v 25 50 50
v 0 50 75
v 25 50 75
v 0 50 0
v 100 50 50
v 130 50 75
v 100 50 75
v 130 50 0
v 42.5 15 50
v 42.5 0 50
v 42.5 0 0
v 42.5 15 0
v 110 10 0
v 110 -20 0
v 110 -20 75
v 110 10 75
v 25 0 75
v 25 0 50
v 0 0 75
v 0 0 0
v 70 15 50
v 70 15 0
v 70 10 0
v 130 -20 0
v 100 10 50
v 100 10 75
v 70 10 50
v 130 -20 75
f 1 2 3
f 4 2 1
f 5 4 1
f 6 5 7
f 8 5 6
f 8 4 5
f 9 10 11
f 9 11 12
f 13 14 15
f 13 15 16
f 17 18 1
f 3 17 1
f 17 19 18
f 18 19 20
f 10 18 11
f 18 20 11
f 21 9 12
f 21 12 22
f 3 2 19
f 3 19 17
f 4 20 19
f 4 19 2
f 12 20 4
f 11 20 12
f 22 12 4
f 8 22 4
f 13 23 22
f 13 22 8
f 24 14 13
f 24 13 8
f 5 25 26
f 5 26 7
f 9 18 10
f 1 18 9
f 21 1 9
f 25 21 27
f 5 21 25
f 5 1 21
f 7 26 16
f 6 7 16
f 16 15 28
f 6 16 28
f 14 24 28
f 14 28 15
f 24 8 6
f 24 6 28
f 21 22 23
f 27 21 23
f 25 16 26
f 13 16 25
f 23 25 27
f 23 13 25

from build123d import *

# Parameters (mm, degrees)
F0_W     = 25
F0_H     = 50
F1_DEPTH = 75
F3_DEPTH = 50
F5_DEPTH = 75


with BuildPart() as f1:
    # F0 (on Top) → F1 (new body)
    with BuildSketch(Plane.XY):
        with Locations((12.5, 25)):
            Rectangle(F0_W, F0_H)
    extrude(amount=F1_DEPTH)

    # F2 (on Top) → F3 (join)
    with BuildSketch(Plane.XY):
        Polygon((25, 50), (25, 0), (42.5, 0), (42.5, 15), (70, 15), (70, 10), (100, 10), (100, 40), (100, 50), (90, 50), align=None)
    extrude(amount=F3_DEPTH)

    # F4 (on face) → F5 (join)
    with BuildSketch(Plane(origin=(0, 0, 0), x_dir=(1, 0, 0), z_dir=(0, 0, -1))):
        Polygon((110, -10), (100, -10), (100, -50), (130, -50), (130, 20), (110, 20), align=None)
    extrude(amount=-F5_DEPTH)


solid = f1.part
